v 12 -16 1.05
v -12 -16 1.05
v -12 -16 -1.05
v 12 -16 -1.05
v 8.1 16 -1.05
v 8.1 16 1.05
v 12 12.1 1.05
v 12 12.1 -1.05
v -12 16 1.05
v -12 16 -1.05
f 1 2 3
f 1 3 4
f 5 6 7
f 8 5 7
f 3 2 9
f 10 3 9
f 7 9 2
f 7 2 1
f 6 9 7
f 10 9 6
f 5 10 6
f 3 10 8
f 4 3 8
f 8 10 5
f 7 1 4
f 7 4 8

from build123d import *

# Parameters (mm, degrees)
SKETCH1_W           = 24
SKETCH1_H           = 32
BOSS_EXTRUDE1_DEPTH = 1.05
CUT_EXTRUDE1_DEPTH  = 21.109947787


with BuildPart() as part:
    # Sketch1 → Boss-Extrude1 (new, symmetric)
    with BuildSketch(Plane.XY):
        Rectangle(SKETCH1_W, SKETCH1_H)
    extrude(amount=BOSS_EXTRUDE1_DEPTH, both=True)

    # Sketch2 → Cut-Extrude1 (cut, through all)
    with BuildSketch(Plane.XY.offset(1.05)):
        Polygon((12, 16), (8.1, 16), (12, 12.1), align=None)
    extrude(amount=-CUT_EXTRUDE1_DEPTH, mode=Mode.SUBTRACT)


solid = part.part
